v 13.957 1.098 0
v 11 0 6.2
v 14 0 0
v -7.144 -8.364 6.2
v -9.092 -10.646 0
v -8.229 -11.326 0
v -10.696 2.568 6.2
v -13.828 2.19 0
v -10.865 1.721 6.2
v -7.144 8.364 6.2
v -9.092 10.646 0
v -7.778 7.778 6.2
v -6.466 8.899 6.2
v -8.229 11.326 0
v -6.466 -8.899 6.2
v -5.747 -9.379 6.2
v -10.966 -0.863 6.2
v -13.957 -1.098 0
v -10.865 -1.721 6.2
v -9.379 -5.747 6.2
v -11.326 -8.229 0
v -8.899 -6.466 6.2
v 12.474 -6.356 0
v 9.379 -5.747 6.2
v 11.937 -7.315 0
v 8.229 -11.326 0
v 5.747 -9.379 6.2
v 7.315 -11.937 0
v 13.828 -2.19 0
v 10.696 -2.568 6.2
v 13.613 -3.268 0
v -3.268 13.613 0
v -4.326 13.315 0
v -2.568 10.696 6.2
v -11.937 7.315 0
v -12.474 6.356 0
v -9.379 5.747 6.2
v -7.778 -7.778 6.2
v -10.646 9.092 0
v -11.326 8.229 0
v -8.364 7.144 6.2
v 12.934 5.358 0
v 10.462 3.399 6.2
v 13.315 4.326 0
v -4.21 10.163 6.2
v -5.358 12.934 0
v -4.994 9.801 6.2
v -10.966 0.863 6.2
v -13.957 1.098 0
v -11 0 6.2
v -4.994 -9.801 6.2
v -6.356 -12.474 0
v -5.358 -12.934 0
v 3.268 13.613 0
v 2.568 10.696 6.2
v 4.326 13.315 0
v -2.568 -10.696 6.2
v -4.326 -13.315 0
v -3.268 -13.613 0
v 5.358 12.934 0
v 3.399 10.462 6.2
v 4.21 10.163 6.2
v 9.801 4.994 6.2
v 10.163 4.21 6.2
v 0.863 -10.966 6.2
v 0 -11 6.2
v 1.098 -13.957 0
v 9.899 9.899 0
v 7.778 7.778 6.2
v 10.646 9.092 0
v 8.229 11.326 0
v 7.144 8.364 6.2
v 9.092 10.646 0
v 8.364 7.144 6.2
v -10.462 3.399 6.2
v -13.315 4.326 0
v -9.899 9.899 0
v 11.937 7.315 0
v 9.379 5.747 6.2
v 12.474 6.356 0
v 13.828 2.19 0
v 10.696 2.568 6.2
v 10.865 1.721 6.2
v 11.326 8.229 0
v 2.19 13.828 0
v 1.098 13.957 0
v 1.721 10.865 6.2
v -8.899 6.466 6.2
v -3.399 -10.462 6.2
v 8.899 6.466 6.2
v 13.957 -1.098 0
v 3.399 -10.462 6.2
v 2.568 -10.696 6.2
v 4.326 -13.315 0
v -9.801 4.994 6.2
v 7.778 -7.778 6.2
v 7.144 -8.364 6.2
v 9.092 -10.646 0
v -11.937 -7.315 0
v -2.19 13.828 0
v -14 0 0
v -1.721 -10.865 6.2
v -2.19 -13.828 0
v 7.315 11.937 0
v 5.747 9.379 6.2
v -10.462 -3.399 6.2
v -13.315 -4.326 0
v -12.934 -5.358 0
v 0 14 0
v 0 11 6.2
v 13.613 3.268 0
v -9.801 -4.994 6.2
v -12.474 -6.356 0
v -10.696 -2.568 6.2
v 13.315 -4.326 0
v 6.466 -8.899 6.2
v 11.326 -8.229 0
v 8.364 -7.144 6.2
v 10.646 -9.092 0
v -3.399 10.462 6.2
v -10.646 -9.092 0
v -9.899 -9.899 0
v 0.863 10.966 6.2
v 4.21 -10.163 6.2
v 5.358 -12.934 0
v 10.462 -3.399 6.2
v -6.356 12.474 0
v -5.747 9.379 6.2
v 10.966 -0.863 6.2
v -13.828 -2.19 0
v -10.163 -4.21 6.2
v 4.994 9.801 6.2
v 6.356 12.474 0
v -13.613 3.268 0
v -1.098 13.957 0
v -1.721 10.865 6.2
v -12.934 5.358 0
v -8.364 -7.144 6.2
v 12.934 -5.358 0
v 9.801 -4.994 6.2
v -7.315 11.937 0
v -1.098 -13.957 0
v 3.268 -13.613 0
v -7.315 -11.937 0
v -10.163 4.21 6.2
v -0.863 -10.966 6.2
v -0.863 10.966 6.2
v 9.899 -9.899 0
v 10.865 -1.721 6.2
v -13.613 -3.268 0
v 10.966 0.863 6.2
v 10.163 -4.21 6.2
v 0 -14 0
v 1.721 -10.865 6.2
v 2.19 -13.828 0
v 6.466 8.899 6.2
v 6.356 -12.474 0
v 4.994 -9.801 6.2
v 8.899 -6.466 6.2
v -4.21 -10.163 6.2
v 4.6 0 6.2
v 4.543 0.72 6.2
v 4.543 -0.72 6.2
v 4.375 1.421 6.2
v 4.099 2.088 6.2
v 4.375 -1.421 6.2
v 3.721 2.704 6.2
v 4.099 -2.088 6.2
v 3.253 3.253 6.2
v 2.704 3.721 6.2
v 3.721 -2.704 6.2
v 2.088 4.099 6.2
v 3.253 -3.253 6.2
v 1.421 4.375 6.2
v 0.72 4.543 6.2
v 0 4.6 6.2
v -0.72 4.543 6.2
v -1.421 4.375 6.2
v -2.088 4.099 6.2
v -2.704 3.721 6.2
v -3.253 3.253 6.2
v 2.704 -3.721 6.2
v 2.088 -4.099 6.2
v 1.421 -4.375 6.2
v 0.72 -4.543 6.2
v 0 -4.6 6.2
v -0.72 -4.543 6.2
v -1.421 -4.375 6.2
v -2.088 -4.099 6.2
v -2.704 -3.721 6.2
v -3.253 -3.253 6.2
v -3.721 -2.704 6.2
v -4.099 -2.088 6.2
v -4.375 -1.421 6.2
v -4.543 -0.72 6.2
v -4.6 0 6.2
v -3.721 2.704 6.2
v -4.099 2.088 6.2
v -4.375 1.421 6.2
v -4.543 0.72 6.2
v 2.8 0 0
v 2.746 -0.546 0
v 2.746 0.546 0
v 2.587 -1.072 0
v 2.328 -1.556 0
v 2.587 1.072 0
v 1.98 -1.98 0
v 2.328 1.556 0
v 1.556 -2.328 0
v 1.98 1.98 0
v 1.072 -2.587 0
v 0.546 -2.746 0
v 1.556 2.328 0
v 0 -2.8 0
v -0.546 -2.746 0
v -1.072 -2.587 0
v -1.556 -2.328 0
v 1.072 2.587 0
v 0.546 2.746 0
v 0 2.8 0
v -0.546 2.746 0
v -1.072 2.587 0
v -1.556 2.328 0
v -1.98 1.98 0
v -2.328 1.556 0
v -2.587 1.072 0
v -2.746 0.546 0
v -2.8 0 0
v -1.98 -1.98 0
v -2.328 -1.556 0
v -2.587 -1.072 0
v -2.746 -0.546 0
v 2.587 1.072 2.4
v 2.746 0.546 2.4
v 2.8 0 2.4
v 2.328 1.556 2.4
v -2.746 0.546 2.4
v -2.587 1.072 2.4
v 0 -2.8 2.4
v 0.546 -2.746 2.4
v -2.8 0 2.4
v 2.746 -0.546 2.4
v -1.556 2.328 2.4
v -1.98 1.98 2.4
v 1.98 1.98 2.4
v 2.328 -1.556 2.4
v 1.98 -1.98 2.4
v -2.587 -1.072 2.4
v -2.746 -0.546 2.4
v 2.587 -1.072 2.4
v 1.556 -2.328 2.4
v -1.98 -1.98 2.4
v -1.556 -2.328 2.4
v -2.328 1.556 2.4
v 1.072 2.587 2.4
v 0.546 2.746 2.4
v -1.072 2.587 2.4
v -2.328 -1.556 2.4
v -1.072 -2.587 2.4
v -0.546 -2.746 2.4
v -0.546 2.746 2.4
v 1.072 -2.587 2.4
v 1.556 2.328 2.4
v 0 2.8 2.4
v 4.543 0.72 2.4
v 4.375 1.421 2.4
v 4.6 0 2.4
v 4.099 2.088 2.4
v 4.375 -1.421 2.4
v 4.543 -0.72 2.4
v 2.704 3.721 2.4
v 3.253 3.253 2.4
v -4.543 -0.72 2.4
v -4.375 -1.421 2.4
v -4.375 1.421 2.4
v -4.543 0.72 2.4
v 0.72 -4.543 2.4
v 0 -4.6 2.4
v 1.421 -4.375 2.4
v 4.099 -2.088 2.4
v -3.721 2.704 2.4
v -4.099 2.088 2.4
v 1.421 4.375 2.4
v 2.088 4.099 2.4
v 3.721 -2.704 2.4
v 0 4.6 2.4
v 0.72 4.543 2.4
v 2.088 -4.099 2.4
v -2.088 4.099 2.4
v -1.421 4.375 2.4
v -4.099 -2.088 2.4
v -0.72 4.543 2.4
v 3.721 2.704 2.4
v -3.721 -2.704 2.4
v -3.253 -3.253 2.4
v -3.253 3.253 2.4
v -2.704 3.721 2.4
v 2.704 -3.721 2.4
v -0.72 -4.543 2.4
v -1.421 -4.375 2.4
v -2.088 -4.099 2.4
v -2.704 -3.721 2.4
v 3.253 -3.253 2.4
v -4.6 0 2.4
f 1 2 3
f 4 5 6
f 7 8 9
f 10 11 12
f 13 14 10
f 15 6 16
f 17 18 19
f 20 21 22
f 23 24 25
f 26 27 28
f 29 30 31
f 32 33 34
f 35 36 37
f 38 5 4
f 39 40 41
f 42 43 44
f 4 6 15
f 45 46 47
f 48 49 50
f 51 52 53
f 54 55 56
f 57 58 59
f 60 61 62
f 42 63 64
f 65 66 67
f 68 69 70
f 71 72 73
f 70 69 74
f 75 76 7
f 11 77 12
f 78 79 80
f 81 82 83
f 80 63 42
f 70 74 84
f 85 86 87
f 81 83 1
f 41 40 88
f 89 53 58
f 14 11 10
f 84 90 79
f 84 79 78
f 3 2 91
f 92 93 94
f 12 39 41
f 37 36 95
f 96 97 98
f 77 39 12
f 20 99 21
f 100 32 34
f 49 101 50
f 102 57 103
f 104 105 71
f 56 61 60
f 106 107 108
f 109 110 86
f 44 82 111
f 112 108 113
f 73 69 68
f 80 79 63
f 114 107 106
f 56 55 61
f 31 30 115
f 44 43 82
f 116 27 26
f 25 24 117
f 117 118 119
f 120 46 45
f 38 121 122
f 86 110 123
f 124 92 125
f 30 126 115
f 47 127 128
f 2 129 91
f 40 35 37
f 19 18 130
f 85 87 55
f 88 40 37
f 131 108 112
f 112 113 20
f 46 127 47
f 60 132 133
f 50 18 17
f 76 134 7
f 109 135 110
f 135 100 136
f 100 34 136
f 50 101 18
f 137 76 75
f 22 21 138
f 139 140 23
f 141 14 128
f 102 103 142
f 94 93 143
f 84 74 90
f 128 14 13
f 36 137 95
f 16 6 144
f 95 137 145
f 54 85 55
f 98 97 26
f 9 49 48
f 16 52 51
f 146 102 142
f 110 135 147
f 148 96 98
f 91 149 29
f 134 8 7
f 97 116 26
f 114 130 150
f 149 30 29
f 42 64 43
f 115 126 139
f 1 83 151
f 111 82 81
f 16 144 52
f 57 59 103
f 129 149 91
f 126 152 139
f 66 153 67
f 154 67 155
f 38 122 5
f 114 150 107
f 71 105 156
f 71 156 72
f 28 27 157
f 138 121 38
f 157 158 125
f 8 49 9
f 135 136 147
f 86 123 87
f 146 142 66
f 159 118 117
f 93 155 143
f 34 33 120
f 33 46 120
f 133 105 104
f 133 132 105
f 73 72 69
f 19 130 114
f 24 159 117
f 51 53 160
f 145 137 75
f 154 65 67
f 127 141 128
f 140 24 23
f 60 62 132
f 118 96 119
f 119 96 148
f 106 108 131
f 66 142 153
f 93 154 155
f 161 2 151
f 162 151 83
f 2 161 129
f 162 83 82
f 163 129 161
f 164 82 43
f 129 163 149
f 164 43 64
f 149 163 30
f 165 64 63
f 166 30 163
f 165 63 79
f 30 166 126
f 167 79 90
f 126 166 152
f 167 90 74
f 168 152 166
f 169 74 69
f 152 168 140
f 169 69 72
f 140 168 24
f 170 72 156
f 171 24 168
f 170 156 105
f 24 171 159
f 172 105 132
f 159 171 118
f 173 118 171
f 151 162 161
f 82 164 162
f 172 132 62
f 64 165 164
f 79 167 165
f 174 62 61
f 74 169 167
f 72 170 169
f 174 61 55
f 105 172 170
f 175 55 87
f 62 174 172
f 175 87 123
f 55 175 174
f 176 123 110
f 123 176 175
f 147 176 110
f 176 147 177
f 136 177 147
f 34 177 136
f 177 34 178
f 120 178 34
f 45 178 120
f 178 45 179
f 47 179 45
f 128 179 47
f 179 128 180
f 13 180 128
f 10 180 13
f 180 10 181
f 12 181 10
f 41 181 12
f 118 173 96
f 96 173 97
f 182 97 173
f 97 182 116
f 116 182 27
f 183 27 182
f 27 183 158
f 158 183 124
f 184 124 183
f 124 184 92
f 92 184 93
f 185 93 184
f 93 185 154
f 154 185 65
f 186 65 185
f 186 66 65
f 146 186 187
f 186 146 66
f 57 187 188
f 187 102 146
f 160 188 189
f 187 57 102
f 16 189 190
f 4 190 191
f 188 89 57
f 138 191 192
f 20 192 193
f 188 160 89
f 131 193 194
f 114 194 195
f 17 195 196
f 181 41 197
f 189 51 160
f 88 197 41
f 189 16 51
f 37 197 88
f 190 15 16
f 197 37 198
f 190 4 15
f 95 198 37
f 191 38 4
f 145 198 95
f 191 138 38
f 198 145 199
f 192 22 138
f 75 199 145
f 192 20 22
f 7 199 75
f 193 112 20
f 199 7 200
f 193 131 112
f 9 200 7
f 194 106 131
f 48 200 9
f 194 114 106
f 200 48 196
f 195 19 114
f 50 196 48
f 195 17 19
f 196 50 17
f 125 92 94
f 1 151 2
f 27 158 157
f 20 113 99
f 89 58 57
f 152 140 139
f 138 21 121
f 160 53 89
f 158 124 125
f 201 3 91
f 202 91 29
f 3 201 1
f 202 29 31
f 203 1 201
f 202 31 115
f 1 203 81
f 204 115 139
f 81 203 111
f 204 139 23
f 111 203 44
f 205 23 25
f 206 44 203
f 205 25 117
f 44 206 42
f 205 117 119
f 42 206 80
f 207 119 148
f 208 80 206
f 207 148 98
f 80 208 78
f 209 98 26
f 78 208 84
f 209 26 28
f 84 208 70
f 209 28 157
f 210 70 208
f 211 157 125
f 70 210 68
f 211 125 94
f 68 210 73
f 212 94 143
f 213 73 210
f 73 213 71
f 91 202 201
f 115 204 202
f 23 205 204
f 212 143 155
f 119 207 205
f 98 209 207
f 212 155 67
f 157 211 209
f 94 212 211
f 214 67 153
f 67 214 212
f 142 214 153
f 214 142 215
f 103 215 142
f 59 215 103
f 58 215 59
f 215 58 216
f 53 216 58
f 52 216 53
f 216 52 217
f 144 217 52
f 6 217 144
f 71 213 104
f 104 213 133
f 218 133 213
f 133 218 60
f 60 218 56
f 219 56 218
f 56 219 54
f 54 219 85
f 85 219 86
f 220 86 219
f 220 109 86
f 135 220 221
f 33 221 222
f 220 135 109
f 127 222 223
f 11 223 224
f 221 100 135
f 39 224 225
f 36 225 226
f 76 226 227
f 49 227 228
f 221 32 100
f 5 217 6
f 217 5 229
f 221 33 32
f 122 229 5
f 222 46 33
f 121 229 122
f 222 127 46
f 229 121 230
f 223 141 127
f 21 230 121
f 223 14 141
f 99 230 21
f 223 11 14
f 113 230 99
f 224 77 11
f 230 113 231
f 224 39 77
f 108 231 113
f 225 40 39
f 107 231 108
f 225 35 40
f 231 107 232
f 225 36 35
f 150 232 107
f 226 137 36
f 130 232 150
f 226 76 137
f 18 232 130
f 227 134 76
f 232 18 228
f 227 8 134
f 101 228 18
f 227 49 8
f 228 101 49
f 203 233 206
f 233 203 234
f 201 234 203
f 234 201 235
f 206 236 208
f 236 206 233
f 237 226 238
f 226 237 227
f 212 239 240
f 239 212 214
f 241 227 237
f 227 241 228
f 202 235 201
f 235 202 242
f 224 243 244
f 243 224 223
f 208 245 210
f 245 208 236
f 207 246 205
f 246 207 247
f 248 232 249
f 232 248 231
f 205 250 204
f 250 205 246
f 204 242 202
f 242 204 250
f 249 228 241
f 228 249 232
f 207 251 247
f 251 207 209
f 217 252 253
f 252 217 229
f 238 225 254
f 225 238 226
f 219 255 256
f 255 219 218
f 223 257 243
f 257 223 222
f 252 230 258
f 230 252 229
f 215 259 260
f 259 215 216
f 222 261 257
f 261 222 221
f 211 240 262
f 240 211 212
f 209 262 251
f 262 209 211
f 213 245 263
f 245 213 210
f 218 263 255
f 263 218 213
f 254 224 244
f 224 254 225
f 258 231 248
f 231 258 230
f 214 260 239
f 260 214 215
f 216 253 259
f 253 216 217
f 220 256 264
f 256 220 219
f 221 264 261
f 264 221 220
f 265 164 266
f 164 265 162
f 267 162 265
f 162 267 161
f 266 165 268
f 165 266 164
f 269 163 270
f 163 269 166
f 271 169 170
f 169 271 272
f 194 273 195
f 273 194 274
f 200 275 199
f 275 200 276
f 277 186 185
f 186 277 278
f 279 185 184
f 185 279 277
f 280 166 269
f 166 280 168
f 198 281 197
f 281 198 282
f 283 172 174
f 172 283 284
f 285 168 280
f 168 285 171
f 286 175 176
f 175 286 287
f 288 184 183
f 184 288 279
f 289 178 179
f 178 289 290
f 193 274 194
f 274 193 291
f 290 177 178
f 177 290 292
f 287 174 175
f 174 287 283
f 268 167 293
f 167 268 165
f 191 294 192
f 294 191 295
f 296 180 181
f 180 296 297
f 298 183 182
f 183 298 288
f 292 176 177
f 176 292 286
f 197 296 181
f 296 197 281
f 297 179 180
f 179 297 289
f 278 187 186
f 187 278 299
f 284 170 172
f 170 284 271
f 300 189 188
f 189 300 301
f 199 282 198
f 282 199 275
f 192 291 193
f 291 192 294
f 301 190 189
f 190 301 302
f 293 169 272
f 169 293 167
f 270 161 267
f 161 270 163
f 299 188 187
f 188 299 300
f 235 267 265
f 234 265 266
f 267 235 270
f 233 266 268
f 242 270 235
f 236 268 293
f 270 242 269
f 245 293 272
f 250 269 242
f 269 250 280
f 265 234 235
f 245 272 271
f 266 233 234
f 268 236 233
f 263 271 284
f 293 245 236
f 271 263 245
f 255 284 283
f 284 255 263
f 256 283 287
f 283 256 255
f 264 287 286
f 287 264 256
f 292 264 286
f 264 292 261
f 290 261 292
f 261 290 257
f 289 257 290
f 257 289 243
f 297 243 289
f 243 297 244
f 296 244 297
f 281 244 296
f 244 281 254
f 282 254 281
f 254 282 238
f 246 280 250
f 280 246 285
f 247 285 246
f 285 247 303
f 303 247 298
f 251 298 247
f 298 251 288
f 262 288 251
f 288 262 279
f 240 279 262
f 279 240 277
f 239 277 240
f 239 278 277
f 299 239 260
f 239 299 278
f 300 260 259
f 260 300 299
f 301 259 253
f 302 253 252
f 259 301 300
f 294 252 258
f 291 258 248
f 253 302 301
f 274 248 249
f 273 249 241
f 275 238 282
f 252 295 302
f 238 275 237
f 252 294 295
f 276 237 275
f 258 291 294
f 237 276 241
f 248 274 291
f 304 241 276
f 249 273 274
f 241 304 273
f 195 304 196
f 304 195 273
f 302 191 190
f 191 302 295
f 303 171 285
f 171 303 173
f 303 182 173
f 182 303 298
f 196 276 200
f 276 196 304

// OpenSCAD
// Feet for Kossel

m5clear = 5.0;
m5head = 8.6;
m5headDepth = 2.8;
baseThickness = 2.4;
headRecess = 1.0;
height = m5headDepth+baseThickness+headRecess;
extraClear = 0.6;
overlap = 0.1;

difference() {
	cylinder(r1=14, r2=11, h=height, $fn=80);
	translate([0,0,-overlap])
		cylinder(r=(m5clear+extraClear)/2, h=height+2*overlap, $fn=32);
	translate([0,0,baseThickness])
		cylinder(r=(m5head+extraClear)/2, h=height-baseThickness+overlap, $fn=40);
}
